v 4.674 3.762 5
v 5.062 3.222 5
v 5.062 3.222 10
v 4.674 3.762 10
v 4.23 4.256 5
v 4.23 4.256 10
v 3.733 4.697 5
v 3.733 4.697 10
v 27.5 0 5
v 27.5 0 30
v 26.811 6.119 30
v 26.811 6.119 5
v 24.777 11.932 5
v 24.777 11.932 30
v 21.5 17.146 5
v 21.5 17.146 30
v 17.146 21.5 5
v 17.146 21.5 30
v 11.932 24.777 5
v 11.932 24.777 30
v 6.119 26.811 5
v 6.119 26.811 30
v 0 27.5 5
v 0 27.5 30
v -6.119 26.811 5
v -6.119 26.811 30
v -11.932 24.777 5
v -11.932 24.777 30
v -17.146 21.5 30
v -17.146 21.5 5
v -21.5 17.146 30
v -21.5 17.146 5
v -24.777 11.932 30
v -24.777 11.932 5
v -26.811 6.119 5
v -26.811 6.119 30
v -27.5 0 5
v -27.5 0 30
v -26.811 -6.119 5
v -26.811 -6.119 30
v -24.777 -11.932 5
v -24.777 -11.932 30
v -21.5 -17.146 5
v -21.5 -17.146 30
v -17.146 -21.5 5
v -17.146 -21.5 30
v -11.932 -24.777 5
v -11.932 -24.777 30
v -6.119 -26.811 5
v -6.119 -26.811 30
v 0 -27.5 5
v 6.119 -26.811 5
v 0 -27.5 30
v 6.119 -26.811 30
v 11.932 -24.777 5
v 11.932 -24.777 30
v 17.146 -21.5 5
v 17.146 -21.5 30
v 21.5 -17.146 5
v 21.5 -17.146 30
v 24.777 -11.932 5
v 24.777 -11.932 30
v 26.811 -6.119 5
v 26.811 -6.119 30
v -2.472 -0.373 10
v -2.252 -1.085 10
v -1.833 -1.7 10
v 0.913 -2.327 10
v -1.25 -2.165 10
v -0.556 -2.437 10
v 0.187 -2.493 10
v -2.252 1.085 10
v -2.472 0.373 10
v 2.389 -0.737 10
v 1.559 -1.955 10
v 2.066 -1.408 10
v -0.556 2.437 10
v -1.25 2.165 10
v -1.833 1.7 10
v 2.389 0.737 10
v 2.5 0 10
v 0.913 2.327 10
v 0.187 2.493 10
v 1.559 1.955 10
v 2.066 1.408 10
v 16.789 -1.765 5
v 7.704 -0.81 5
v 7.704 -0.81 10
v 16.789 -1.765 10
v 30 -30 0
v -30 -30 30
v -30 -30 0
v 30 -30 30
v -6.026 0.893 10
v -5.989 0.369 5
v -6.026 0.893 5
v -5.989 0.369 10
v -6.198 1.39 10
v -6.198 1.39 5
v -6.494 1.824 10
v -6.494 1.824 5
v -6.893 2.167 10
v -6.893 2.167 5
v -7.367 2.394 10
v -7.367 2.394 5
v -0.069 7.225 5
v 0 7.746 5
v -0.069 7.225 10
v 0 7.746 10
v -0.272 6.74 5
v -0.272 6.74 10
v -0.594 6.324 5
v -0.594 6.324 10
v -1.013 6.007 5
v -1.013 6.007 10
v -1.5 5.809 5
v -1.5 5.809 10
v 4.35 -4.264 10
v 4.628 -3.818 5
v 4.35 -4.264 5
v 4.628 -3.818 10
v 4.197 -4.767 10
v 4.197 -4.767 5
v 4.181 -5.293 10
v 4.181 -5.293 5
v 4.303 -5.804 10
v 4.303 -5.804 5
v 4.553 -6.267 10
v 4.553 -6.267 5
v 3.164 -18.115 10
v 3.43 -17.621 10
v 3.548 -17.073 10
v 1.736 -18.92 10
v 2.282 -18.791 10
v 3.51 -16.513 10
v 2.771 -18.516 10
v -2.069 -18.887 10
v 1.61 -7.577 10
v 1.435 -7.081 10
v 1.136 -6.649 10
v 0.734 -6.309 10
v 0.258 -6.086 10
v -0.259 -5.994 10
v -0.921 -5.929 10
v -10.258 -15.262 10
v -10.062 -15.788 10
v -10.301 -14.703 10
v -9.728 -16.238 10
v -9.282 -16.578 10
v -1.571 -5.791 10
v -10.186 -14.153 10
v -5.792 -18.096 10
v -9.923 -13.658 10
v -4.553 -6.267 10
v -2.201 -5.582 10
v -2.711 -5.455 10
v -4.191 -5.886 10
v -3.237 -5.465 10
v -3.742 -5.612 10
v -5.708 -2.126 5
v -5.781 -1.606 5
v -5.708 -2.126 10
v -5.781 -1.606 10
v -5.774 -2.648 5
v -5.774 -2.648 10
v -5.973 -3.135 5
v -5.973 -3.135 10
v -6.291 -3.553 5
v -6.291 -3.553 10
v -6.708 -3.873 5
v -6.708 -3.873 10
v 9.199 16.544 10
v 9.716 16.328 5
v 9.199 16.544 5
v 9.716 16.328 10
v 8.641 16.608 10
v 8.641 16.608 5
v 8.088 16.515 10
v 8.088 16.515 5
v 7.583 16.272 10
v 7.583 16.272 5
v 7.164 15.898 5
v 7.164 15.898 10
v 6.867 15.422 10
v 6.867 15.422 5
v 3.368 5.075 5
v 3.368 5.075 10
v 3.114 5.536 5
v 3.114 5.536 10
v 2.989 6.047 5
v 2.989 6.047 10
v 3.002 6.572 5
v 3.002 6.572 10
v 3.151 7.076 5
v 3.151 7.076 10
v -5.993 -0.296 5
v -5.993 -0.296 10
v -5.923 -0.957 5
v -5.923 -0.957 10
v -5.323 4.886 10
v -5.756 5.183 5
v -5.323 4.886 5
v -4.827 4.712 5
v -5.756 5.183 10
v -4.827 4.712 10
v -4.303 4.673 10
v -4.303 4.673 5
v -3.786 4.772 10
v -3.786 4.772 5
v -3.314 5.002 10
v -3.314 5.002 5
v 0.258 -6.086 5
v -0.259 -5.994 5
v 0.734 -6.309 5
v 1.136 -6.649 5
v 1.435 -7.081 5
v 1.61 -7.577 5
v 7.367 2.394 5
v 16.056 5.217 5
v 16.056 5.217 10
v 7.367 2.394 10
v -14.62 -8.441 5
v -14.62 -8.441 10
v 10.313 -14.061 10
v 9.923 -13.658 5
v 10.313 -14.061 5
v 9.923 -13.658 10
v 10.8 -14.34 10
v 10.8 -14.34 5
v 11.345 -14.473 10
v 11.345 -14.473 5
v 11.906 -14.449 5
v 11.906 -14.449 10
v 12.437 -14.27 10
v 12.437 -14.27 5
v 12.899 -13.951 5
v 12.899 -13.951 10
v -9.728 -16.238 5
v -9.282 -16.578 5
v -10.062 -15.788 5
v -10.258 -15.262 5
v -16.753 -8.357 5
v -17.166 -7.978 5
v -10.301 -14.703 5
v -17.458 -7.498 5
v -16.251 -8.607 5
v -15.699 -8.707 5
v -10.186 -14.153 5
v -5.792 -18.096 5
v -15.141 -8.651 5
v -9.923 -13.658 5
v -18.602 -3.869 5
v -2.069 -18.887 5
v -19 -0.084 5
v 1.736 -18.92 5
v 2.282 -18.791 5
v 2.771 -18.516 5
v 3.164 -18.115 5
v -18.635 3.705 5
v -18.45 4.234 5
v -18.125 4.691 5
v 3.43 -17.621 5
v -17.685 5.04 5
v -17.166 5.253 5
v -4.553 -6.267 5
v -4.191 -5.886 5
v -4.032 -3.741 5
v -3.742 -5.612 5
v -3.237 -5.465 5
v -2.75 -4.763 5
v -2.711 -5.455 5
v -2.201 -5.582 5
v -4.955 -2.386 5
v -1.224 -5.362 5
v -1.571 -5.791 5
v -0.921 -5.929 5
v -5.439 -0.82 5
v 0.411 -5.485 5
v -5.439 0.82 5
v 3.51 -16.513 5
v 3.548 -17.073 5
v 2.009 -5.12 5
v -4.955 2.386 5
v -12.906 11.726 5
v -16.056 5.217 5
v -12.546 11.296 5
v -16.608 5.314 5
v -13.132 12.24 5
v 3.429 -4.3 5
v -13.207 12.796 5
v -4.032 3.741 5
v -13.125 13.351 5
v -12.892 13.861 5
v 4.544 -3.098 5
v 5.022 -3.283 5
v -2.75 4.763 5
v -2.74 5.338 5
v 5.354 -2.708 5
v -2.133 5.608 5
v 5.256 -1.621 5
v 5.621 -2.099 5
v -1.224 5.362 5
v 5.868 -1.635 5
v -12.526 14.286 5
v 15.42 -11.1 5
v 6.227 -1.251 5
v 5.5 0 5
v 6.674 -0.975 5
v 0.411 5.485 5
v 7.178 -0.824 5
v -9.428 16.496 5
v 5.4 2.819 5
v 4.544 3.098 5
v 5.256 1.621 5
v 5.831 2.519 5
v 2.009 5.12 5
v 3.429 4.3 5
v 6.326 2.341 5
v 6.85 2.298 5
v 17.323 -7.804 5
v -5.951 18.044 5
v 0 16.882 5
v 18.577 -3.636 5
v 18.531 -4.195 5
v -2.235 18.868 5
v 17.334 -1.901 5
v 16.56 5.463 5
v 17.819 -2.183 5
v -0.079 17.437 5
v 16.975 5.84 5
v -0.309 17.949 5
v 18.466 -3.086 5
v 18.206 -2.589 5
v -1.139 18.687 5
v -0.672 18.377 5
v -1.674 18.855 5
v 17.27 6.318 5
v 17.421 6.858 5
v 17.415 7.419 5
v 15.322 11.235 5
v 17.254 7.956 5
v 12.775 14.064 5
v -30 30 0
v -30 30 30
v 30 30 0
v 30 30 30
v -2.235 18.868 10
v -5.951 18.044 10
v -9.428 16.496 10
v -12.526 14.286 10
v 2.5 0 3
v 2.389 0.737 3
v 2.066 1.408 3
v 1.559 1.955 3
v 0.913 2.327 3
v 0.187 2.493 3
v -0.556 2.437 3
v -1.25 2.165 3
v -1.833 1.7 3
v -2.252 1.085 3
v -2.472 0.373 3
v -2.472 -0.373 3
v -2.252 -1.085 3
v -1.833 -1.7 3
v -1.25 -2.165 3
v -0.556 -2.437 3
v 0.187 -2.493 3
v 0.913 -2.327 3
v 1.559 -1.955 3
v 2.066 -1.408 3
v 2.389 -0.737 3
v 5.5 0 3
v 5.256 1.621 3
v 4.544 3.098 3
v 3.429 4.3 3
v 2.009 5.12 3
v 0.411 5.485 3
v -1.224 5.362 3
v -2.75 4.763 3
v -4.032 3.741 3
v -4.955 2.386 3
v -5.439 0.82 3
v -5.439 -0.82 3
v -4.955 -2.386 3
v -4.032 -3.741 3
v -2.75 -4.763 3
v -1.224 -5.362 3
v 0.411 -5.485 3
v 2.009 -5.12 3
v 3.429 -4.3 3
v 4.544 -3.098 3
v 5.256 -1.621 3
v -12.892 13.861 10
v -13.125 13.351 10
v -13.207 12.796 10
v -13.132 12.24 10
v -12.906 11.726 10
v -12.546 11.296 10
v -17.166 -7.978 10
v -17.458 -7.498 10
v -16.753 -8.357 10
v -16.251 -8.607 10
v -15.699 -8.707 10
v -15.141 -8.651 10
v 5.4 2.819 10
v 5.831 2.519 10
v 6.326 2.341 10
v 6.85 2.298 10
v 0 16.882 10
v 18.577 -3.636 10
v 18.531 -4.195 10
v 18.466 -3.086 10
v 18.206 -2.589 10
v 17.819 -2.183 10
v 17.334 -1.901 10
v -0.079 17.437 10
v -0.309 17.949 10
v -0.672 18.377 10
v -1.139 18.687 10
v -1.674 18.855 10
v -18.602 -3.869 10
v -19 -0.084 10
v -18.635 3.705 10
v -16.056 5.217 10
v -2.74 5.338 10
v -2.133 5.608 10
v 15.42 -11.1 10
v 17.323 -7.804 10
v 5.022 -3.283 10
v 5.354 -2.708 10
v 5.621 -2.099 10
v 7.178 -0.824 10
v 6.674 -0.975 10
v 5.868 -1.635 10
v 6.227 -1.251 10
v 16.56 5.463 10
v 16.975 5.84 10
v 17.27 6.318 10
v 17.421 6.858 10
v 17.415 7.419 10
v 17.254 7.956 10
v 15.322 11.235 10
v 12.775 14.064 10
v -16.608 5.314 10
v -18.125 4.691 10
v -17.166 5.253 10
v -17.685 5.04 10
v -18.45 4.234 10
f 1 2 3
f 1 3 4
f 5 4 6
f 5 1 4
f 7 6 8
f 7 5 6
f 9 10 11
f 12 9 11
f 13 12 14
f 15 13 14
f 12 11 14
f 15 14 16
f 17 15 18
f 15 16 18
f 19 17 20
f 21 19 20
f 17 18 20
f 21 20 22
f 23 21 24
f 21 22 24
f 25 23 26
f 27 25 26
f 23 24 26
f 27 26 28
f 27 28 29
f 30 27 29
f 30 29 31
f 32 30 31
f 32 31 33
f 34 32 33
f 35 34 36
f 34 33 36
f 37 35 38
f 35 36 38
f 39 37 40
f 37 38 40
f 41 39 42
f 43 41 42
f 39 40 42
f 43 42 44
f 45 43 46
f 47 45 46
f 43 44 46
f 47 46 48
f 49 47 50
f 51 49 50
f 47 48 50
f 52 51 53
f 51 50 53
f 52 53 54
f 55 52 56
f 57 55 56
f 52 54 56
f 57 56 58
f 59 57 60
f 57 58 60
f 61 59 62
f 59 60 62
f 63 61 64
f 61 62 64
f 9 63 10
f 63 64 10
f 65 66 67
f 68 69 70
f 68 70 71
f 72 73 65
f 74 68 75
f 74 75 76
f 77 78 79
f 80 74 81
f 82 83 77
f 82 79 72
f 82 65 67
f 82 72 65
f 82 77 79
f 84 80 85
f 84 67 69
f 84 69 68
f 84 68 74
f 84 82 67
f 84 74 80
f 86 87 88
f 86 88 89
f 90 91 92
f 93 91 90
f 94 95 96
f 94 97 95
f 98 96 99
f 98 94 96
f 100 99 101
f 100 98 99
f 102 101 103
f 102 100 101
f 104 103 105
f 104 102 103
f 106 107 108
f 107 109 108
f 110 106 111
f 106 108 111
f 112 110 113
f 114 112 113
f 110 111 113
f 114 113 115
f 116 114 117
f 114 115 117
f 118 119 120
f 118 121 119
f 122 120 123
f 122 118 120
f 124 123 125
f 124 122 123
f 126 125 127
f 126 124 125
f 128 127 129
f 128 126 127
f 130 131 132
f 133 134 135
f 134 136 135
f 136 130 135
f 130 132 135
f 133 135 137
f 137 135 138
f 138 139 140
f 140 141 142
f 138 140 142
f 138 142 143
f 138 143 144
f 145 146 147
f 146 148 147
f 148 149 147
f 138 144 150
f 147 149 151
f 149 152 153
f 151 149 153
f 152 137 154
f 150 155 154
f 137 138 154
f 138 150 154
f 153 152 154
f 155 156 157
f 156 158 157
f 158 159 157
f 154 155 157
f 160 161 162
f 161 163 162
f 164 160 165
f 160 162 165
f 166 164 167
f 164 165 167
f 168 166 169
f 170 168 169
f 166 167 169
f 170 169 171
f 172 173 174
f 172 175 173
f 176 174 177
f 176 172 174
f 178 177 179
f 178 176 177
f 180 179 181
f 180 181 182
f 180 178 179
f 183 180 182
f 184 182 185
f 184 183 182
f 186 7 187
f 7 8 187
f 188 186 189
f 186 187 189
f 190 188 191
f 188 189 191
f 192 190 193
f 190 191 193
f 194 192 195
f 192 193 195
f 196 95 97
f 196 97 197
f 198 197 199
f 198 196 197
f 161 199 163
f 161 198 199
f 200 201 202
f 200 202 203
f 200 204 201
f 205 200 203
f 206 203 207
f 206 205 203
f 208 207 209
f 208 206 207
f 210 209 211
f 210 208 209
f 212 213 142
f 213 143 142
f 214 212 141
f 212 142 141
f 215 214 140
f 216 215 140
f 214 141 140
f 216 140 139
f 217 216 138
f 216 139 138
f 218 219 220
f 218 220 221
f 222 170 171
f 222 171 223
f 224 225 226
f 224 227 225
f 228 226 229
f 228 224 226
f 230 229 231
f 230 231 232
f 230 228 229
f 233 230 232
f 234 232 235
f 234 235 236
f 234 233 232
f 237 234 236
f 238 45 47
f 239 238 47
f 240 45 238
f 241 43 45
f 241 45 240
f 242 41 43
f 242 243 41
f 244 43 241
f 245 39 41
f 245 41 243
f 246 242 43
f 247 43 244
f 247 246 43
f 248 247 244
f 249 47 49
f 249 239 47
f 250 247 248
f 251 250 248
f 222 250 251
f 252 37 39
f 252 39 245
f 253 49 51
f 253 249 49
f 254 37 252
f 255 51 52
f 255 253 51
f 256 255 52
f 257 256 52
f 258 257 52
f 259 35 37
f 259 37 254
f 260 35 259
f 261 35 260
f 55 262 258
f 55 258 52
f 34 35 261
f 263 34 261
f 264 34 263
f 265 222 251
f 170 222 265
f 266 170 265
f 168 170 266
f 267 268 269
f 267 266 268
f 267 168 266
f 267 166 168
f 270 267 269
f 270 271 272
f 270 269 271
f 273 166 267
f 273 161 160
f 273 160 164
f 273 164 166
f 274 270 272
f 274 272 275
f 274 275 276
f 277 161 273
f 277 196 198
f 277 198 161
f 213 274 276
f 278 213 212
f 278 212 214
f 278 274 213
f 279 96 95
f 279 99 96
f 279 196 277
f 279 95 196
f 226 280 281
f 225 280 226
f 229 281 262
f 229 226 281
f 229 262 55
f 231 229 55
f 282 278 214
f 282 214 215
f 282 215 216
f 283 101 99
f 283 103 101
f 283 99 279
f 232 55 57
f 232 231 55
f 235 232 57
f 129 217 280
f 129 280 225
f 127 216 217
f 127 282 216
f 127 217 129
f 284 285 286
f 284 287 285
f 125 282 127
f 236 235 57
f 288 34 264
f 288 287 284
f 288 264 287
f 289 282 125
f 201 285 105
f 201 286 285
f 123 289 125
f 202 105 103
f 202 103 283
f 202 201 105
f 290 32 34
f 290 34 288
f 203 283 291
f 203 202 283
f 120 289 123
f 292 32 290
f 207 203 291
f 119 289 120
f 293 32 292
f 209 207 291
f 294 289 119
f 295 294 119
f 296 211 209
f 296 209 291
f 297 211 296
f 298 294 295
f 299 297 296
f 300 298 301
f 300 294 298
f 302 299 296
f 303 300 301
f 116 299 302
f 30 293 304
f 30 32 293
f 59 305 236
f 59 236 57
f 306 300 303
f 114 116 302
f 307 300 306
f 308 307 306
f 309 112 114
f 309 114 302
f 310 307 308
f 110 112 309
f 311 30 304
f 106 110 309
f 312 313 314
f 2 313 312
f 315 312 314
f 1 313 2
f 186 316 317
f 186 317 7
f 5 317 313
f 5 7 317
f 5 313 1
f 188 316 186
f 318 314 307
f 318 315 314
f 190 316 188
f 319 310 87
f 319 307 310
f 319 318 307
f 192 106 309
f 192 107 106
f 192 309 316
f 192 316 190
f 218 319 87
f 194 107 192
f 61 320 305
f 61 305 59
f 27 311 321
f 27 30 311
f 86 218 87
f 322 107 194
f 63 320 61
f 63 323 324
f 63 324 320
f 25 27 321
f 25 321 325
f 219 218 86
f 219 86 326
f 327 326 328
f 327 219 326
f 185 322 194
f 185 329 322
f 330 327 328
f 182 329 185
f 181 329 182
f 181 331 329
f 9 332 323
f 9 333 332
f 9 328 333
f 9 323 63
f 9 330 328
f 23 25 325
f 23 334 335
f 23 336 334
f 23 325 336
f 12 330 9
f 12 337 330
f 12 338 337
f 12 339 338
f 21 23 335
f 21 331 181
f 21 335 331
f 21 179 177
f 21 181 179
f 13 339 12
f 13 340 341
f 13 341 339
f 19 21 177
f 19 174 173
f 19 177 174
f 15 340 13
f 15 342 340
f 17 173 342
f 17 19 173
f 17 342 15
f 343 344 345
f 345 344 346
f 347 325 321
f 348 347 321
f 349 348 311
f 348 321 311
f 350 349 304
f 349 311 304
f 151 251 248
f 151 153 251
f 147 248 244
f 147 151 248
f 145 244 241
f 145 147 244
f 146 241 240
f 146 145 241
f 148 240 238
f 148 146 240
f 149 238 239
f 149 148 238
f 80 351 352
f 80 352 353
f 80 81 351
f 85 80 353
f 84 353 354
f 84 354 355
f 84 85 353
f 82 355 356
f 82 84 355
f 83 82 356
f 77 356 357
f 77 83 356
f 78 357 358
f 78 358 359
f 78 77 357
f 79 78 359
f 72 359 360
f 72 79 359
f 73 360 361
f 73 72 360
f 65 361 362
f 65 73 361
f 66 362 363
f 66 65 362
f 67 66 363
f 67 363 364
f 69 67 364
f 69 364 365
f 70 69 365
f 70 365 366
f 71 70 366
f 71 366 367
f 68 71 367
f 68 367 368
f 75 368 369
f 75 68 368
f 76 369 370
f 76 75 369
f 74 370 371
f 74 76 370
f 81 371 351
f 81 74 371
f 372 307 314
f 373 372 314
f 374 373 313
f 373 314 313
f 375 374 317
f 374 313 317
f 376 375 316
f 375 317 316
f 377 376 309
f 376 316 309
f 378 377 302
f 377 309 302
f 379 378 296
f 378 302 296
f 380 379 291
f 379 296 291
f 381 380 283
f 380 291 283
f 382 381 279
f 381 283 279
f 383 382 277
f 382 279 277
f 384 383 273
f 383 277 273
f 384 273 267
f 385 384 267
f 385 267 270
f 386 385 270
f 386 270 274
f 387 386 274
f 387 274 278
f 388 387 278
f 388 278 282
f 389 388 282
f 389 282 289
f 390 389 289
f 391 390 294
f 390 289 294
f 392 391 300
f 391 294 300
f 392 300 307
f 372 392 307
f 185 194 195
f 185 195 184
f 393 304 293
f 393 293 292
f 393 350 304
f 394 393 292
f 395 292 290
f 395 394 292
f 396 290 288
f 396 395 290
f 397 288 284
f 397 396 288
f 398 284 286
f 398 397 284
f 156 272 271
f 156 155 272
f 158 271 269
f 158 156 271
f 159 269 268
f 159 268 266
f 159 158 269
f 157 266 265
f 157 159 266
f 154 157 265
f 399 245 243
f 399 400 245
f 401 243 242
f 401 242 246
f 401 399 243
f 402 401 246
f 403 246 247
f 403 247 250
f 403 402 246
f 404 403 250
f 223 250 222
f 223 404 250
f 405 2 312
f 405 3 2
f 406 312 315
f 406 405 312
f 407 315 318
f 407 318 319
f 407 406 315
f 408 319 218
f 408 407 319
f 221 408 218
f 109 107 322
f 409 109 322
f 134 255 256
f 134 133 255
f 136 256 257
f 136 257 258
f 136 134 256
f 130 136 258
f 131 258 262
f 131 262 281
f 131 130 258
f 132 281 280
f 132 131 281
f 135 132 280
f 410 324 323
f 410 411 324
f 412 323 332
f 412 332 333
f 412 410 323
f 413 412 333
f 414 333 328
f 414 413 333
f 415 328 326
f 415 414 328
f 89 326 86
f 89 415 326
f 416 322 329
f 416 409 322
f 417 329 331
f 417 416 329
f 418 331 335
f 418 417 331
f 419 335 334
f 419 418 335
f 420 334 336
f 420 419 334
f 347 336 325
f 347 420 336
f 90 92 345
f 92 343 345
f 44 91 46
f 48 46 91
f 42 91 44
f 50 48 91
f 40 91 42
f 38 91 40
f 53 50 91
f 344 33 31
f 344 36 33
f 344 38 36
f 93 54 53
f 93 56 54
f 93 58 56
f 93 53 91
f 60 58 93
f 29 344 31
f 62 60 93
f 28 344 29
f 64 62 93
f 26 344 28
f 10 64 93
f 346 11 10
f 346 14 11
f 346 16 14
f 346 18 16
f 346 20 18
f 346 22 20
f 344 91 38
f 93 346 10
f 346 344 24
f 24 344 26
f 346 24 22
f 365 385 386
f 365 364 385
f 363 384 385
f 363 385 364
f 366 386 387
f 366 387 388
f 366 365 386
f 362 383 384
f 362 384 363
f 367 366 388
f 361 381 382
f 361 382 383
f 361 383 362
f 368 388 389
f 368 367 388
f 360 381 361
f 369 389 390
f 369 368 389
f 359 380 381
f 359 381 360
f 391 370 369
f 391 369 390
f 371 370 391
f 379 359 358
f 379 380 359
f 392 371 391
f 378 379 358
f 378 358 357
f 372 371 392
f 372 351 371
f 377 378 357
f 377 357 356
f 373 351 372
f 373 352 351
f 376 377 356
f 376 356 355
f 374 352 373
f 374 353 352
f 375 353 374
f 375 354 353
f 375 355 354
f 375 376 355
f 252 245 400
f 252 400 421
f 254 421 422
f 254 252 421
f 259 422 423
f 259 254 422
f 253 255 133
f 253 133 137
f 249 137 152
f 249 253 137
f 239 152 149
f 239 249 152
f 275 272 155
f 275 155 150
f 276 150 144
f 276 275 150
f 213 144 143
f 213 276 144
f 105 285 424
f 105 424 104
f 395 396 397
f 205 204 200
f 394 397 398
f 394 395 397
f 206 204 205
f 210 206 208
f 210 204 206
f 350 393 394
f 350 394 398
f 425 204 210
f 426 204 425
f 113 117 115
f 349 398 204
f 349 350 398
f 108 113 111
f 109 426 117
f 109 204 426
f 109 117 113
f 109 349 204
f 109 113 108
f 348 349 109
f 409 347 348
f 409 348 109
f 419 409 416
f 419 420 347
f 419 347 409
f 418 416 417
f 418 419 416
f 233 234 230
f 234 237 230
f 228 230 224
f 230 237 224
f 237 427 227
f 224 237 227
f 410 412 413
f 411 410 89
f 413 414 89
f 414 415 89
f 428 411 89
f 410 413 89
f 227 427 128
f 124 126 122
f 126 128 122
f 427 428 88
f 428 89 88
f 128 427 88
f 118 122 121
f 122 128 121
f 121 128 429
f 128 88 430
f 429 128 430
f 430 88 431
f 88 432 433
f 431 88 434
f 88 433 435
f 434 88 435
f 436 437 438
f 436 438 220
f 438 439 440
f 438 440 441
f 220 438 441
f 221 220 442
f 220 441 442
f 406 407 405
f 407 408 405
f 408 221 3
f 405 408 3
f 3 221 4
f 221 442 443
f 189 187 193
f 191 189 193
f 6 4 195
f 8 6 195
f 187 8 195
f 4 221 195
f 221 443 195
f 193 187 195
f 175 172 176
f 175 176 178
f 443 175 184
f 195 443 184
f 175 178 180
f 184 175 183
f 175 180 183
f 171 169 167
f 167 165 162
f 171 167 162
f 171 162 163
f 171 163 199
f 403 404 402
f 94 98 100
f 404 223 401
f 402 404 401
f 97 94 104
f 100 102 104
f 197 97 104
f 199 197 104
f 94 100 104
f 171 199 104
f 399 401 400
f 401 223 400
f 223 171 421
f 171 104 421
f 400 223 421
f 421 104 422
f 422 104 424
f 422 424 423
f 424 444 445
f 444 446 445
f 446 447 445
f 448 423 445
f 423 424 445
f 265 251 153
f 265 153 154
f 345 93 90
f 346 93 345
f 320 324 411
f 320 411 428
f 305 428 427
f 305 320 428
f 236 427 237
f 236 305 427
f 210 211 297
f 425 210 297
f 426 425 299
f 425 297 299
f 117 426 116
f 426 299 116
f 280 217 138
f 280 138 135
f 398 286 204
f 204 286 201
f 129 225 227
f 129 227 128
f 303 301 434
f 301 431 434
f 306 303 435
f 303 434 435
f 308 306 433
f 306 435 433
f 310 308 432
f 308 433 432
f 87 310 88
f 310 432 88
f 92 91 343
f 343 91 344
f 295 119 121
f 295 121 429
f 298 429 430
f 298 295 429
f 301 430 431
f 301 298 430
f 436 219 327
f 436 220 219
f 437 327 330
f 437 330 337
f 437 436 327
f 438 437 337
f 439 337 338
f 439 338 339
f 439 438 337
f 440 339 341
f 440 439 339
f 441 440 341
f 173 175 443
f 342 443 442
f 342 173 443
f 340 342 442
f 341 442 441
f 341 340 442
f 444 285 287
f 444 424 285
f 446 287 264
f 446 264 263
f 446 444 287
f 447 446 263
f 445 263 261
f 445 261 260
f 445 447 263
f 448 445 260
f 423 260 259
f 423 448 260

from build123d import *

# Parameters (mm, degrees)
CROQUIS1_R              = 30
SALIENTE_EXTRUIR1_DEPTH = 30
CROQUIS2_R              = 27.5
CORTAR_EXTRUIR1_DEPTH   = 25
CROQUIS3_R              = 2.5
SALIENTE_EXTRUIR2_DEPTH = 5
CROQUIS4_R              = 5.5
CROQUIS4_R_2            = 2.5
CORTAR_EXTRUIR2_DEPTH   = 2
CROQUIS6_W              = 60
CROQUIS6_H              = 60
CROQUIS6_R              = 27.5
SALIENTE_EXTRUIR3_DEPTH = 30
SALIENTE_EXTRUIR5_DEPTH = 5
REDONDEO1_R             = 2


with BuildPart() as part:
    # Croquis1 → Saliente-Extruir1 (new body)
    with BuildSketch(Plane.XY):
        Circle(CROQUIS1_R)
    extrude(amount=SALIENTE_EXTRUIR1_DEPTH)

    # Croquis2 → Cortar-Extruir1 (cut)
    with BuildSketch(Plane.XY.offset(30)):
        Circle(CROQUIS2_R)
    extrude(amount=-CORTAR_EXTRUIR1_DEPTH, mode=Mode.SUBTRACT)

    # Croquis3 → Saliente-Extruir2 (add)
    with BuildSketch(Plane.XY.offset(5)):
        Circle(CROQUIS3_R)
    extrude(amount=SALIENTE_EXTRUIR2_DEPTH)

    # Croquis4 → Cortar-Extruir2 (cut)
    with BuildSketch(Plane.XY.offset(5)):
        Circle(CROQUIS4_R)
        Circle(CROQUIS4_R_2, mode=Mode.SUBTRACT)
    extrude(amount=-CORTAR_EXTRUIR2_DEPTH, mode=Mode.SUBTRACT)

    # Croquis6 → Saliente-Extruir3 (add)
    with BuildSketch(Plane.XY.offset(30)):
        Rectangle(CROQUIS6_W, CROQUIS6_H)
        Circle(CROQUIS6_R, mode=Mode.SUBTRACT)
    extrude(amount=-SALIENTE_EXTRUIR3_DEPTH)

    # Croquis7 → Saliente-Extruir5 (add)
    with BuildSketch(Plane.XY.offset(5)):
        with BuildLine():
            Line((0, 6), (0, 19))
            ThreePointArc((0, 19), (-7.727996218, 17.357363695), (-14.119751684, 12.713481521))
            Line((-14.119751684, 12.713481521), (-4.458868953, 4.014783638))
            ThreePointArc((-4.458868953, 4.014783638), (-2.440419858, 5.481272746), (0, 6))
        make_face()
        with BuildLine():
            Line((2.440419858, 5.481272746), (7.727996218, 17.357363695))
            ThreePointArc((7.727996218, 17.357363695), (14.119751684, 12.713481521), (18.07007381, 5.871322893))
            Line((18.07007381, 5.871322893), (5.706339098, 1.854101966))
            ThreePointArc((5.706339098, 1.854101966), (4.458868953, 4.014783638), (2.440419858, 5.481272746))
        make_face()
        with BuildLine():
            Line((5.967131372, -0.62717078), (18.895916012, -1.986040802))
            ThreePointArc((18.895916012, -1.986040802), (16.454482672, -9.5), (11.167919794, -15.371322893))
            Line((11.167919794, -15.371322893), (3.526711514, -4.854101966))
            ThreePointArc((3.526711514, -4.854101966), (5.196152423, -3), (5.967131372, -0.62717078))
        make_face()
        with BuildLine():
            Line((1.247470145, -5.868885604), (3.950322126, -18.584804414))
            ThreePointArc((3.950322126, -18.584804414), (-3.950322126, -18.584804414), (-11.167919794, -15.371322893))
            Line((-11.167919794, -15.371322893), (-3.526711514, -4.854101966))
            ThreePointArc((-3.526711514, -4.854101966), (-1.247470145, -5.868885604), (1.247470145, -5.868885604))
        make_face()
        with BuildLine():
            Line((-5.196152423, -3), (-16.454482672, -9.5))
            ThreePointArc((-16.454482672, -9.5), (-18.895916012, -1.986040802), (-18.07007381, 5.871322893))
            Line((-18.07007381, 5.871322893), (-5.706339098, 1.854101966))
            ThreePointArc((-5.706339098, 1.854101966), (-5.967131372, -0.62717078), (-5.196152423, -3))
        make_face()
    extrude(amount=SALIENTE_EXTRUIR5_DEPTH)

    # Redondeo1
    redondeo1_edges = [part.edges().sort_by_distance(p)[0] for p in [
        (-4.458868953, 4.014783638, 7.5),
        (0, 6, 7.5),
        (0, 19, 7.5),
        (-14.119751684, 12.713481521, 7.5),
        (2.440419858, 5.481272746, 7.5),
        (5.706339098, 1.854101966, 7.5),
        (18.07007381, 5.871322893, 7.5),
        (7.727996218, 17.357363695, 7.5),
        (5.967131372, -0.62717078, 7.5),
        (3.526711514, -4.854101966, 7.5),
        (11.167919794, -15.371322893, 7.5),
        (18.895916012, -1.986040802, 7.5),
        (1.247470145, -5.868885604, 7.5),
        (-3.526711514, -4.854101966, 7.5),
        (-11.167919794, -15.371322893, 7.5),
        (3.950322126, -18.584804414, 7.5),
        (-5.196152423, -3, 7.5),
        (-5.706339098, 1.854101966, 7.5),
        (-18.07007381, 5.871322893, 7.5),
        (-16.454482672, -9.5, 7.5),
    ]]
    fillet(redondeo1_edges, radius=REDONDEO1_R)


solid = part.part
